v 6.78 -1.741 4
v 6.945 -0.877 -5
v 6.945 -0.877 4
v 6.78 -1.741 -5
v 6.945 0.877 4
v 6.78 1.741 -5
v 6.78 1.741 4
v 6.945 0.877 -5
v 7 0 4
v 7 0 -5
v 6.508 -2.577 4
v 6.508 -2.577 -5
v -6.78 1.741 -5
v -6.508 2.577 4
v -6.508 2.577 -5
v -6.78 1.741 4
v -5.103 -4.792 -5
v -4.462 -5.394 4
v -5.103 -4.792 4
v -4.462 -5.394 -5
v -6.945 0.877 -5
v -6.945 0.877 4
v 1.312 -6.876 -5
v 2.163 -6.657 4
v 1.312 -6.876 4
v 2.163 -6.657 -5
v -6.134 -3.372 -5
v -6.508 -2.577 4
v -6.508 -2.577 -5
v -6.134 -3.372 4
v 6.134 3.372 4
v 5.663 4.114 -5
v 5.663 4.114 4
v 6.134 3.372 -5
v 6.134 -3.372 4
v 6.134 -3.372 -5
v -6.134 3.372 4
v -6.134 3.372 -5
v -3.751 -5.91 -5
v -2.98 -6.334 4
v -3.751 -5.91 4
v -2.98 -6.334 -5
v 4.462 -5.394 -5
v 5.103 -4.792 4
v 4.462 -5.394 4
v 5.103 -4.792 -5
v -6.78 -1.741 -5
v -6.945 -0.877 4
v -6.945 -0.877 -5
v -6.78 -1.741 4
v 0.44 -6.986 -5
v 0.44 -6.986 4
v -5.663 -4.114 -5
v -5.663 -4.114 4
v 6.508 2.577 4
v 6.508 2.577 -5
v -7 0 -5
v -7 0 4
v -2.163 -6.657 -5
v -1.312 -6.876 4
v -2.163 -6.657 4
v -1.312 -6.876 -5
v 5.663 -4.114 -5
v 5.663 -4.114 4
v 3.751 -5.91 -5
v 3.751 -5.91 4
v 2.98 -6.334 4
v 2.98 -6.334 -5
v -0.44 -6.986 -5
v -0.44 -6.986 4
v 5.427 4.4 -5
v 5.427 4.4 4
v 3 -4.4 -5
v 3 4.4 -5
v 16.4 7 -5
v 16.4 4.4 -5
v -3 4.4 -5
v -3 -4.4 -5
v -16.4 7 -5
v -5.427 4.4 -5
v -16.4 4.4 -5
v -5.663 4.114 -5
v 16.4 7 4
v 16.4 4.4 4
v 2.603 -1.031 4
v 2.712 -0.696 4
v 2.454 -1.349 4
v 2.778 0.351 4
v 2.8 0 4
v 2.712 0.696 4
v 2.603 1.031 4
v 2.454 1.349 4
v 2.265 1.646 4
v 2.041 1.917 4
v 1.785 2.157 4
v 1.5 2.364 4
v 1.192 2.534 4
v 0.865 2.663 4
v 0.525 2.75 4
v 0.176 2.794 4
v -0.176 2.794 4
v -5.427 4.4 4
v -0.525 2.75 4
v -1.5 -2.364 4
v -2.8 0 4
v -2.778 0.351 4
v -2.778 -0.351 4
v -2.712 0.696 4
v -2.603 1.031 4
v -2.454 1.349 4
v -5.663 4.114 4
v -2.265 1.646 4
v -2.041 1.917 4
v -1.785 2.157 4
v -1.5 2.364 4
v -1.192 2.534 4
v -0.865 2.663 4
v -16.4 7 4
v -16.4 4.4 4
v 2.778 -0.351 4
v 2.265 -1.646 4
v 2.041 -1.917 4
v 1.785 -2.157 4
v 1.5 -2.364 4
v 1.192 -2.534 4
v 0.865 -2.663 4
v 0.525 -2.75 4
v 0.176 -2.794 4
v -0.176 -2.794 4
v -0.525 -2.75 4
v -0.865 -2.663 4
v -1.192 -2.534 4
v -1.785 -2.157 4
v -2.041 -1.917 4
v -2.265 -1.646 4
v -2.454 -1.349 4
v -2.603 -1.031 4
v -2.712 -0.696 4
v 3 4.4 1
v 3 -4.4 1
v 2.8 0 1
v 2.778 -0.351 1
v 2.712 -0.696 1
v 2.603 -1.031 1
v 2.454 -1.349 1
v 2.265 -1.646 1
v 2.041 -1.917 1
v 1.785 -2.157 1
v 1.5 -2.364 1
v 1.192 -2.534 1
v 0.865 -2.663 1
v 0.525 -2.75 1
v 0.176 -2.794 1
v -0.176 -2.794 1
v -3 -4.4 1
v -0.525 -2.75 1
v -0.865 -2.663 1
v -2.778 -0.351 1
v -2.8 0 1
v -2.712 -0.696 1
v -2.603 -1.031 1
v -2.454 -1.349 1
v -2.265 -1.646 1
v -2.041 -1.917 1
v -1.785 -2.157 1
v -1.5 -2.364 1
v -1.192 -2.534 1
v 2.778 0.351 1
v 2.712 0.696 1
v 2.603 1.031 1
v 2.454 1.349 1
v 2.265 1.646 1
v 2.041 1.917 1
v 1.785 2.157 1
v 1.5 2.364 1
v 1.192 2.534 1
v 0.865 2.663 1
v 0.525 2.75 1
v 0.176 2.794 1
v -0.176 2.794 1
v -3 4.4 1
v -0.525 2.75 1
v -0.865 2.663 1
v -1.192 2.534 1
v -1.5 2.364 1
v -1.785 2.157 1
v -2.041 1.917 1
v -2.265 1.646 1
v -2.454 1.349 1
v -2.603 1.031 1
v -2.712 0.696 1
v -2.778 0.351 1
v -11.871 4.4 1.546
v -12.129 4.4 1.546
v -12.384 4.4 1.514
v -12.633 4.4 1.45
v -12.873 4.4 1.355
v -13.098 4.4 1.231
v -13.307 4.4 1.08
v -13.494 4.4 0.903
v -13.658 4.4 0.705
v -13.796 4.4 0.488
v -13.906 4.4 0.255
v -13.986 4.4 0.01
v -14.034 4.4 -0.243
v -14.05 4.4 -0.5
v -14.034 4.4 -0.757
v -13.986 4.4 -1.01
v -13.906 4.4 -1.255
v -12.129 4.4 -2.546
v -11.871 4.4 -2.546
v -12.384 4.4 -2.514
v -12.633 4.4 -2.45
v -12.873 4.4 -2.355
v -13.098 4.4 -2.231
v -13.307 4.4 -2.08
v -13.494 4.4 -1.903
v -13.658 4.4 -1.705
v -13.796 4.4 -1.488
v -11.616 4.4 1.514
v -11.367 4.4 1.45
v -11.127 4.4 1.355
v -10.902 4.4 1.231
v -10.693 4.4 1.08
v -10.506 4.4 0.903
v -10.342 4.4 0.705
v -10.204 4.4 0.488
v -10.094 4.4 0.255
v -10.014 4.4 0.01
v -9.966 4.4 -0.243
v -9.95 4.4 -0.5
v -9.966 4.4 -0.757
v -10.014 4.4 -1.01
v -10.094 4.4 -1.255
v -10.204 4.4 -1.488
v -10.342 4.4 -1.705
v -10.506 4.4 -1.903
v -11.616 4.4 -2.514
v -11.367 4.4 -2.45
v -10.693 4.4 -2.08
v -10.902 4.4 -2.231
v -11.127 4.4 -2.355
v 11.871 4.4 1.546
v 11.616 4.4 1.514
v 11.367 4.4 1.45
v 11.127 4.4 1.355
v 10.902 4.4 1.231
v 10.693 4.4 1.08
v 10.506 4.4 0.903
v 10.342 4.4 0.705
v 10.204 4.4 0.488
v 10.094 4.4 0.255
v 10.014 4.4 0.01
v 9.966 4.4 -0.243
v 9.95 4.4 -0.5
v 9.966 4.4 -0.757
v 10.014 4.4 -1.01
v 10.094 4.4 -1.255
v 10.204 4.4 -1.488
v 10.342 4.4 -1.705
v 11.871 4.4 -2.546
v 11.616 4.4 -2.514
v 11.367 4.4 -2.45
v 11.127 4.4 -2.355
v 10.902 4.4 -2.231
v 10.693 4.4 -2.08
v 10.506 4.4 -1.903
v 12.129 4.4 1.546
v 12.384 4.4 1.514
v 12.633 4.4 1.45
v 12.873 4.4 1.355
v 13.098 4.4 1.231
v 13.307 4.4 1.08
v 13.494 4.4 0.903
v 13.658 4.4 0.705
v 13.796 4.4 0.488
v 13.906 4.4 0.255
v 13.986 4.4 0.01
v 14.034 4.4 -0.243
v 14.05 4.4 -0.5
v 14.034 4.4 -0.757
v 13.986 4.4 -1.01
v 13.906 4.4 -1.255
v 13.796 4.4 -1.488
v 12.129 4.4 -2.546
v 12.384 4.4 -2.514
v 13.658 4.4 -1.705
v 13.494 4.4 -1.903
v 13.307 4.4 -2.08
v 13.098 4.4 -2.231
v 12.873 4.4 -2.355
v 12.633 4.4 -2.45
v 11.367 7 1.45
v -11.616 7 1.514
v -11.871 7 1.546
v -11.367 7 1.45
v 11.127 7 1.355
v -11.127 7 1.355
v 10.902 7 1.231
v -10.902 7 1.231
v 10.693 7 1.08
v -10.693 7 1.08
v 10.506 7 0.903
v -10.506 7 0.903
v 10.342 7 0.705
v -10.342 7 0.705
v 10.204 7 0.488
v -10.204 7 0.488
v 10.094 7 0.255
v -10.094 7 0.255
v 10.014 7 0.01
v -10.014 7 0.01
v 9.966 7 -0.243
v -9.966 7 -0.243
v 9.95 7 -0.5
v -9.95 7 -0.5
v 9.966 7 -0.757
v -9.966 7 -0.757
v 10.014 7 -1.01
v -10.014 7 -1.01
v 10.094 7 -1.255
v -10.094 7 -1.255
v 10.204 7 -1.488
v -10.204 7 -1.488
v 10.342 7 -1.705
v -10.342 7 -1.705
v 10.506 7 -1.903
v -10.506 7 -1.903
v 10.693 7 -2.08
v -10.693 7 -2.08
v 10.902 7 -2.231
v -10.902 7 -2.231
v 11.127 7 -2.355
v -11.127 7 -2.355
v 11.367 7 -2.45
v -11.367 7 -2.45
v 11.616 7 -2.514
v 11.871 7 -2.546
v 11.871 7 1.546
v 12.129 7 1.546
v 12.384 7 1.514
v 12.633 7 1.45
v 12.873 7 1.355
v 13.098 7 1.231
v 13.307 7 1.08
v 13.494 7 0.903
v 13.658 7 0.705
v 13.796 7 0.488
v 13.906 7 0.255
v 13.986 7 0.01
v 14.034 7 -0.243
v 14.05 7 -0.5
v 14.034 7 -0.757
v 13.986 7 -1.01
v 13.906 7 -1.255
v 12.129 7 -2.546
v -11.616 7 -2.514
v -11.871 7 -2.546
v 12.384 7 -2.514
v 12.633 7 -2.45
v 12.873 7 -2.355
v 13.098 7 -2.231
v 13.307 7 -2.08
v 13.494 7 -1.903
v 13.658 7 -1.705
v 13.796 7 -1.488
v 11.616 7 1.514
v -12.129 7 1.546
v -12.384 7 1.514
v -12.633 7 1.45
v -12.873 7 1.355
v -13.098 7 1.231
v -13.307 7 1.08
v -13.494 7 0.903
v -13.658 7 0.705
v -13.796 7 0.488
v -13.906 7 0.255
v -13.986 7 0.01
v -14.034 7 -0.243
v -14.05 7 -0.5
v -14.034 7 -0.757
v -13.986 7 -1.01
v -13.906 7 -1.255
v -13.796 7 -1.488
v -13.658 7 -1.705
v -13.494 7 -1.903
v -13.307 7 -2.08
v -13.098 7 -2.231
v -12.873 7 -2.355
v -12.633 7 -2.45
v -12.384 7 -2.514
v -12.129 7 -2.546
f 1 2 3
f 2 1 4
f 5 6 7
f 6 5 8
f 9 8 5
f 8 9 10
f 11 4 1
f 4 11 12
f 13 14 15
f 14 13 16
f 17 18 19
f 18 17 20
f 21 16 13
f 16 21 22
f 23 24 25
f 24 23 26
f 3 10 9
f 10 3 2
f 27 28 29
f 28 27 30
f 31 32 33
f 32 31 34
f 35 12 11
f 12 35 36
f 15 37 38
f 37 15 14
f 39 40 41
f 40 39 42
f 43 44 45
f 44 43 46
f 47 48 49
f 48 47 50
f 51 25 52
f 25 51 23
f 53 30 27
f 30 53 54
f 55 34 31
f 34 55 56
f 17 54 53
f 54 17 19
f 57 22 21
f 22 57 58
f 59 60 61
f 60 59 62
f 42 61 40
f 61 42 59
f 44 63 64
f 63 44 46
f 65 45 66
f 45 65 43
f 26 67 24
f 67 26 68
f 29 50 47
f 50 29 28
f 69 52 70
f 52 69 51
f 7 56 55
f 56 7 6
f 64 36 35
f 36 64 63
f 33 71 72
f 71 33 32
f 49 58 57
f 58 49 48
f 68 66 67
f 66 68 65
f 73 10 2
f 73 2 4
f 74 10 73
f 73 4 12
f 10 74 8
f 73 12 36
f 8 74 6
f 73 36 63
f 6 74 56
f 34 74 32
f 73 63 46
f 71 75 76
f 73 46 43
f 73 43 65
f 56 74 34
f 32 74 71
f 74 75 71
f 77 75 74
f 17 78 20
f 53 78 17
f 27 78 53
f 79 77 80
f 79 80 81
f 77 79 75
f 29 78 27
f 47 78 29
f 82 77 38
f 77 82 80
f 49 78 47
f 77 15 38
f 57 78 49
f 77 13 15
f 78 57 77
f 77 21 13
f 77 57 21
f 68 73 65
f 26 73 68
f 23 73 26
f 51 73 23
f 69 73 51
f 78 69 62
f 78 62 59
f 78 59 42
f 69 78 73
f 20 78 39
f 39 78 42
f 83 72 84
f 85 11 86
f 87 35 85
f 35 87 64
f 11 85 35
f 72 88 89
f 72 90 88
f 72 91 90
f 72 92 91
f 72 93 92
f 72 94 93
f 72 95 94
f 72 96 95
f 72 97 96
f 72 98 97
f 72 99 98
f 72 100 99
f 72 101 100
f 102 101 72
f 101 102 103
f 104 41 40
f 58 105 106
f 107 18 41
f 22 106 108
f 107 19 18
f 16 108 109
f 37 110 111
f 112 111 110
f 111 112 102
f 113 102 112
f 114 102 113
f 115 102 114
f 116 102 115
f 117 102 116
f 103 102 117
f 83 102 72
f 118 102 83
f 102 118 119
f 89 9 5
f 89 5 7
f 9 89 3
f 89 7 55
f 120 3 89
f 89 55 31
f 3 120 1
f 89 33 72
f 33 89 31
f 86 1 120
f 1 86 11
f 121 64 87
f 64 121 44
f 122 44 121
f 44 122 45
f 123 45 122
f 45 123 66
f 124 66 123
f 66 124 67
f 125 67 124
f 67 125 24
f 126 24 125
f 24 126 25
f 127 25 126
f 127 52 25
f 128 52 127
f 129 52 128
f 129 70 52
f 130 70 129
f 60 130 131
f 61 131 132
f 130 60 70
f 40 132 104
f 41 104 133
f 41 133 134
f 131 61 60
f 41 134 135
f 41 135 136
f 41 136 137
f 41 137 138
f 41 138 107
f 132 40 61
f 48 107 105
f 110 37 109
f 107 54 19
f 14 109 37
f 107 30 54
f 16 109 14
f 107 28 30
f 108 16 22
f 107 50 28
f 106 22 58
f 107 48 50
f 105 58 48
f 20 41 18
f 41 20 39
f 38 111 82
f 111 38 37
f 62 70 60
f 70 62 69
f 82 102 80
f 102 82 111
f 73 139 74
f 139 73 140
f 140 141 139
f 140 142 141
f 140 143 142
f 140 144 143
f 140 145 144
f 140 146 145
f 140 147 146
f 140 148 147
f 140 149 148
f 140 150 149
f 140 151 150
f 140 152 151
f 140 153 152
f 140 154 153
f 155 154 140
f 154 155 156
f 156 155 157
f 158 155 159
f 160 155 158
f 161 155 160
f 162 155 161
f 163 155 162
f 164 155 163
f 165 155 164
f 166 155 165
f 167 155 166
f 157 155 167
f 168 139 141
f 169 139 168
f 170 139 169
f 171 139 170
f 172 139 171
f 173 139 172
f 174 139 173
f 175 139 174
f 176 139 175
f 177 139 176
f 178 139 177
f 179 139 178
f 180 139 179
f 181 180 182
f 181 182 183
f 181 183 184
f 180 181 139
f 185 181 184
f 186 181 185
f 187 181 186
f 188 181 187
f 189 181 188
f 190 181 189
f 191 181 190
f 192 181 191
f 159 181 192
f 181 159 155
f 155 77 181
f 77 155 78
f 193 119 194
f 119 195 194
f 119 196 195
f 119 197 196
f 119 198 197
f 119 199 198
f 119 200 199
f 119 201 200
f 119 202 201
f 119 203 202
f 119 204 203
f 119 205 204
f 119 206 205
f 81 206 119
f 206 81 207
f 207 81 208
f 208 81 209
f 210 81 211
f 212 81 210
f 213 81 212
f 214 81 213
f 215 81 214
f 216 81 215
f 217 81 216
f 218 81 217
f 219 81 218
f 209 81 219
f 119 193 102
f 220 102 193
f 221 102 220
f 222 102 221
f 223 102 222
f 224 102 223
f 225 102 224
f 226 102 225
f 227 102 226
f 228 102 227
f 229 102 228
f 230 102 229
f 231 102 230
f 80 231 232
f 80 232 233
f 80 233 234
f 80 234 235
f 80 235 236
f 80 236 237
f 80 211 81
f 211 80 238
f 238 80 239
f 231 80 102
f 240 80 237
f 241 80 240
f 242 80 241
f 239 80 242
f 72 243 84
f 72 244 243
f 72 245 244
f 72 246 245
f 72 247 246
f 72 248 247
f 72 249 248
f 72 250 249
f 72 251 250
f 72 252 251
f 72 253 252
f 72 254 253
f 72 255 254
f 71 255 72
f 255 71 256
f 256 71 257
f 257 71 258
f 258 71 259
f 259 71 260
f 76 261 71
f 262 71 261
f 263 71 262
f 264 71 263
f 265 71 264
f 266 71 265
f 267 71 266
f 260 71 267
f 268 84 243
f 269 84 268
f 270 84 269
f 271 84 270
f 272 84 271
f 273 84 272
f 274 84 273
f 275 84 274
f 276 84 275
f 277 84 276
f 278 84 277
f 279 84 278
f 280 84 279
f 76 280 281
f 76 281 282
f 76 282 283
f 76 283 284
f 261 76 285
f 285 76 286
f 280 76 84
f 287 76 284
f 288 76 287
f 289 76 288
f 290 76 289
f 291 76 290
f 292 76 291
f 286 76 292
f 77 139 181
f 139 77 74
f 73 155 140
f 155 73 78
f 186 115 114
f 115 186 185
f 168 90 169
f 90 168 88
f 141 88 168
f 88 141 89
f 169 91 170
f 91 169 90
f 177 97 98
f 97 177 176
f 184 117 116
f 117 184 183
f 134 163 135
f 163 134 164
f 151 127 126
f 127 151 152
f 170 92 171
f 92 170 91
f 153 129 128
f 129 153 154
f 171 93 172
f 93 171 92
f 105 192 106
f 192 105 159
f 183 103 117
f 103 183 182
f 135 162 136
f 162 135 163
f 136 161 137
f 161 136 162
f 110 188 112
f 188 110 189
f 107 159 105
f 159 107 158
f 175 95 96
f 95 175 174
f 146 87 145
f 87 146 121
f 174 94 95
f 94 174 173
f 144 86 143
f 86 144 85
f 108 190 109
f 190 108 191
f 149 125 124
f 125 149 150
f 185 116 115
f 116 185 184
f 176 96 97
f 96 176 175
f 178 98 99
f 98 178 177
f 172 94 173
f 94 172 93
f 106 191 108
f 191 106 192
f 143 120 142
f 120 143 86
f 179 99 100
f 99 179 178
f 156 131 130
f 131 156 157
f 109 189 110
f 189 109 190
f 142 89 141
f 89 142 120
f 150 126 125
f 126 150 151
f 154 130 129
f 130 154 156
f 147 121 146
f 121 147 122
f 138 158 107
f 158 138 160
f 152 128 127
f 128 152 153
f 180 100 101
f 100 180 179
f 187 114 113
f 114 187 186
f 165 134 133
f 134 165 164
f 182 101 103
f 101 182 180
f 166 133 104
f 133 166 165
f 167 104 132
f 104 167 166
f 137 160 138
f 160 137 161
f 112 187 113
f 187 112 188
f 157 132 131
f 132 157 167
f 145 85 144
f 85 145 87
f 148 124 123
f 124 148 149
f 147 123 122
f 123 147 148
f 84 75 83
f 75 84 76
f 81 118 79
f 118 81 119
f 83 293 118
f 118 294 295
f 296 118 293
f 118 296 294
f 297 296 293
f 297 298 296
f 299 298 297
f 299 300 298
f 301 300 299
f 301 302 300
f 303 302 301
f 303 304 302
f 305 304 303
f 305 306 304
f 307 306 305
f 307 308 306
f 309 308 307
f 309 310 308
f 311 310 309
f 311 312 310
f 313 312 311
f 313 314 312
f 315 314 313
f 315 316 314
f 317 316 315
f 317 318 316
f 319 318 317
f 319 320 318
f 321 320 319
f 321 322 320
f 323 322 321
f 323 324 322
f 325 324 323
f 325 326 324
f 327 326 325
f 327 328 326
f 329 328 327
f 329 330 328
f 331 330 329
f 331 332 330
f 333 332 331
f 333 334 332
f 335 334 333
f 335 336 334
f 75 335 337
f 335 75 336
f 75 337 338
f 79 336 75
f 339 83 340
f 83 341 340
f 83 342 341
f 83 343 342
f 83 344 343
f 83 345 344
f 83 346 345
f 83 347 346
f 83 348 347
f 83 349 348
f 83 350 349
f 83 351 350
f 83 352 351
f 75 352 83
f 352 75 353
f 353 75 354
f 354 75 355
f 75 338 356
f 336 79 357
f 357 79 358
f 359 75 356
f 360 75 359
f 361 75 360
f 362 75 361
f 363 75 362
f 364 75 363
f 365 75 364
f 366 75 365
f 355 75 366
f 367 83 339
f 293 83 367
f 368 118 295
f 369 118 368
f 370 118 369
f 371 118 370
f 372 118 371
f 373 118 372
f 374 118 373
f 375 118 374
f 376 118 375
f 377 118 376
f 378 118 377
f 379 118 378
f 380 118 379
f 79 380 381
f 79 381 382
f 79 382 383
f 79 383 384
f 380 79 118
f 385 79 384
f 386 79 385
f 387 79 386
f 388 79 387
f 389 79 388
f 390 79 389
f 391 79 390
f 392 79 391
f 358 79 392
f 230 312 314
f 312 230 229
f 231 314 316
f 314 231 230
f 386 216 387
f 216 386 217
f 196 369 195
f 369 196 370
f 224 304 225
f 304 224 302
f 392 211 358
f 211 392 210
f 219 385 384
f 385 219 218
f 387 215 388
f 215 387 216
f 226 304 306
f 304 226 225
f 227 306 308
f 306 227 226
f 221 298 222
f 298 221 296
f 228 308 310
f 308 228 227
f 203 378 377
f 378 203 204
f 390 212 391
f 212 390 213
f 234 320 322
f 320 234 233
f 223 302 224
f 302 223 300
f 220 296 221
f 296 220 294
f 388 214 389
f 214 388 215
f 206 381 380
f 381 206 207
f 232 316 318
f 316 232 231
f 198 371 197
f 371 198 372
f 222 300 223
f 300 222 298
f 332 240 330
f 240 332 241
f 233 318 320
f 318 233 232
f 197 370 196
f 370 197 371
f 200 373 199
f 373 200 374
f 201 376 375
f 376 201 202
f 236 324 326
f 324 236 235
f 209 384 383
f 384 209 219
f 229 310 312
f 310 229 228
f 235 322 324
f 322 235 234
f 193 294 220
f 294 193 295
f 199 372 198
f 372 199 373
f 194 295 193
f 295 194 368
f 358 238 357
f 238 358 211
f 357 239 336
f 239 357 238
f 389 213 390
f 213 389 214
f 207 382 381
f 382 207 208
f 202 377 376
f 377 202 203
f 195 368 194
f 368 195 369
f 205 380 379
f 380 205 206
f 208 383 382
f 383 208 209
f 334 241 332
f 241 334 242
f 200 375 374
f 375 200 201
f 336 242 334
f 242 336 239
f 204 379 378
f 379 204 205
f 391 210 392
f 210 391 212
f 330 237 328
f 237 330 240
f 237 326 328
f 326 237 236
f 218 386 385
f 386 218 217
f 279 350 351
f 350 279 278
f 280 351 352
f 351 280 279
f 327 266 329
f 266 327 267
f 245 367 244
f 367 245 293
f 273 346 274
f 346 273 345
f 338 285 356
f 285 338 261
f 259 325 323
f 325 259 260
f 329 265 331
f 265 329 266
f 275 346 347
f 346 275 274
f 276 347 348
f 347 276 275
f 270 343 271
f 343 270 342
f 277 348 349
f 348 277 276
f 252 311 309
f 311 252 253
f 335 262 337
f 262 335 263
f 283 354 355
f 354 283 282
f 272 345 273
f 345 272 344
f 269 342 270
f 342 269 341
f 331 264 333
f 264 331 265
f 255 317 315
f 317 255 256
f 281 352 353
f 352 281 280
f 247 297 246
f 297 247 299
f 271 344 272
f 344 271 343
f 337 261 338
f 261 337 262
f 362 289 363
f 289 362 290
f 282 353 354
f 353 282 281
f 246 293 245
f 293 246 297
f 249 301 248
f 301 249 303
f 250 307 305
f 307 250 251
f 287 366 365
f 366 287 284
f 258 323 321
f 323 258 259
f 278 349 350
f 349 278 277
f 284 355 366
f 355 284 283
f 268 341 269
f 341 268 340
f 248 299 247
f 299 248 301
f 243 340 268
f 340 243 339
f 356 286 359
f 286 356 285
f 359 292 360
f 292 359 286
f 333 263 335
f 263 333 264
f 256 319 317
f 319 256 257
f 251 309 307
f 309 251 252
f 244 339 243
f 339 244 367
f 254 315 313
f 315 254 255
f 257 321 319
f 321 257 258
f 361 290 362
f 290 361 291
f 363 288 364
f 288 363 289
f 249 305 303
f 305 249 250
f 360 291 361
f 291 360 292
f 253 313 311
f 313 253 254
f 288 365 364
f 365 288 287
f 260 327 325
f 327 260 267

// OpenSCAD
wall = 4;
washer_d = 10;
thread_d = 5;
tol = 0.6;
width = 5.4;
height = 8.2;
length = 5;
base_width = 2 * width + 2 * 11;
hole_d = 3.5;

// delta = -( wall / 4 );
delta = 0;

module box(){
    difference(){
    translate( [ 0, delta, -length ] )
        cylinder( d = washer_d + wall, h = 4 + length, $fn = 50 );
        translate( [ 0, 0, -length + 1  ] )
            cube( [ width + tol, height + tol, 2 * length ], center = true );
    }
}

difference(){
    box();
    translate( [ 0, 0, -length - 1 ] )
        cylinder( d = thread_d + tol, h = 4 + length + 2, $fn = 50 );
}

difference(){
    translate( [ -base_width / 2, ( height + tol ) / 2, -length ] )
        cube( [ base_width, wall / 2 + ( washer_d - height ) / 2 - tol / 2, length + 4 ] );
    
    translate( [ -12, 50, -( length - 4 ) / 2 ] )
        rotate( 90, [ 1, 0, 0 ] )
            cylinder( d = hole_d + tol, h = 100, $fn = 50 );
    translate( [ 12, 50, -( length - 4 ) / 2 ] )
        rotate( 90, [ 1, 0, 0 ] )
            cylinder( d = hole_d + tol, h = 100, $fn = 50 );
}
